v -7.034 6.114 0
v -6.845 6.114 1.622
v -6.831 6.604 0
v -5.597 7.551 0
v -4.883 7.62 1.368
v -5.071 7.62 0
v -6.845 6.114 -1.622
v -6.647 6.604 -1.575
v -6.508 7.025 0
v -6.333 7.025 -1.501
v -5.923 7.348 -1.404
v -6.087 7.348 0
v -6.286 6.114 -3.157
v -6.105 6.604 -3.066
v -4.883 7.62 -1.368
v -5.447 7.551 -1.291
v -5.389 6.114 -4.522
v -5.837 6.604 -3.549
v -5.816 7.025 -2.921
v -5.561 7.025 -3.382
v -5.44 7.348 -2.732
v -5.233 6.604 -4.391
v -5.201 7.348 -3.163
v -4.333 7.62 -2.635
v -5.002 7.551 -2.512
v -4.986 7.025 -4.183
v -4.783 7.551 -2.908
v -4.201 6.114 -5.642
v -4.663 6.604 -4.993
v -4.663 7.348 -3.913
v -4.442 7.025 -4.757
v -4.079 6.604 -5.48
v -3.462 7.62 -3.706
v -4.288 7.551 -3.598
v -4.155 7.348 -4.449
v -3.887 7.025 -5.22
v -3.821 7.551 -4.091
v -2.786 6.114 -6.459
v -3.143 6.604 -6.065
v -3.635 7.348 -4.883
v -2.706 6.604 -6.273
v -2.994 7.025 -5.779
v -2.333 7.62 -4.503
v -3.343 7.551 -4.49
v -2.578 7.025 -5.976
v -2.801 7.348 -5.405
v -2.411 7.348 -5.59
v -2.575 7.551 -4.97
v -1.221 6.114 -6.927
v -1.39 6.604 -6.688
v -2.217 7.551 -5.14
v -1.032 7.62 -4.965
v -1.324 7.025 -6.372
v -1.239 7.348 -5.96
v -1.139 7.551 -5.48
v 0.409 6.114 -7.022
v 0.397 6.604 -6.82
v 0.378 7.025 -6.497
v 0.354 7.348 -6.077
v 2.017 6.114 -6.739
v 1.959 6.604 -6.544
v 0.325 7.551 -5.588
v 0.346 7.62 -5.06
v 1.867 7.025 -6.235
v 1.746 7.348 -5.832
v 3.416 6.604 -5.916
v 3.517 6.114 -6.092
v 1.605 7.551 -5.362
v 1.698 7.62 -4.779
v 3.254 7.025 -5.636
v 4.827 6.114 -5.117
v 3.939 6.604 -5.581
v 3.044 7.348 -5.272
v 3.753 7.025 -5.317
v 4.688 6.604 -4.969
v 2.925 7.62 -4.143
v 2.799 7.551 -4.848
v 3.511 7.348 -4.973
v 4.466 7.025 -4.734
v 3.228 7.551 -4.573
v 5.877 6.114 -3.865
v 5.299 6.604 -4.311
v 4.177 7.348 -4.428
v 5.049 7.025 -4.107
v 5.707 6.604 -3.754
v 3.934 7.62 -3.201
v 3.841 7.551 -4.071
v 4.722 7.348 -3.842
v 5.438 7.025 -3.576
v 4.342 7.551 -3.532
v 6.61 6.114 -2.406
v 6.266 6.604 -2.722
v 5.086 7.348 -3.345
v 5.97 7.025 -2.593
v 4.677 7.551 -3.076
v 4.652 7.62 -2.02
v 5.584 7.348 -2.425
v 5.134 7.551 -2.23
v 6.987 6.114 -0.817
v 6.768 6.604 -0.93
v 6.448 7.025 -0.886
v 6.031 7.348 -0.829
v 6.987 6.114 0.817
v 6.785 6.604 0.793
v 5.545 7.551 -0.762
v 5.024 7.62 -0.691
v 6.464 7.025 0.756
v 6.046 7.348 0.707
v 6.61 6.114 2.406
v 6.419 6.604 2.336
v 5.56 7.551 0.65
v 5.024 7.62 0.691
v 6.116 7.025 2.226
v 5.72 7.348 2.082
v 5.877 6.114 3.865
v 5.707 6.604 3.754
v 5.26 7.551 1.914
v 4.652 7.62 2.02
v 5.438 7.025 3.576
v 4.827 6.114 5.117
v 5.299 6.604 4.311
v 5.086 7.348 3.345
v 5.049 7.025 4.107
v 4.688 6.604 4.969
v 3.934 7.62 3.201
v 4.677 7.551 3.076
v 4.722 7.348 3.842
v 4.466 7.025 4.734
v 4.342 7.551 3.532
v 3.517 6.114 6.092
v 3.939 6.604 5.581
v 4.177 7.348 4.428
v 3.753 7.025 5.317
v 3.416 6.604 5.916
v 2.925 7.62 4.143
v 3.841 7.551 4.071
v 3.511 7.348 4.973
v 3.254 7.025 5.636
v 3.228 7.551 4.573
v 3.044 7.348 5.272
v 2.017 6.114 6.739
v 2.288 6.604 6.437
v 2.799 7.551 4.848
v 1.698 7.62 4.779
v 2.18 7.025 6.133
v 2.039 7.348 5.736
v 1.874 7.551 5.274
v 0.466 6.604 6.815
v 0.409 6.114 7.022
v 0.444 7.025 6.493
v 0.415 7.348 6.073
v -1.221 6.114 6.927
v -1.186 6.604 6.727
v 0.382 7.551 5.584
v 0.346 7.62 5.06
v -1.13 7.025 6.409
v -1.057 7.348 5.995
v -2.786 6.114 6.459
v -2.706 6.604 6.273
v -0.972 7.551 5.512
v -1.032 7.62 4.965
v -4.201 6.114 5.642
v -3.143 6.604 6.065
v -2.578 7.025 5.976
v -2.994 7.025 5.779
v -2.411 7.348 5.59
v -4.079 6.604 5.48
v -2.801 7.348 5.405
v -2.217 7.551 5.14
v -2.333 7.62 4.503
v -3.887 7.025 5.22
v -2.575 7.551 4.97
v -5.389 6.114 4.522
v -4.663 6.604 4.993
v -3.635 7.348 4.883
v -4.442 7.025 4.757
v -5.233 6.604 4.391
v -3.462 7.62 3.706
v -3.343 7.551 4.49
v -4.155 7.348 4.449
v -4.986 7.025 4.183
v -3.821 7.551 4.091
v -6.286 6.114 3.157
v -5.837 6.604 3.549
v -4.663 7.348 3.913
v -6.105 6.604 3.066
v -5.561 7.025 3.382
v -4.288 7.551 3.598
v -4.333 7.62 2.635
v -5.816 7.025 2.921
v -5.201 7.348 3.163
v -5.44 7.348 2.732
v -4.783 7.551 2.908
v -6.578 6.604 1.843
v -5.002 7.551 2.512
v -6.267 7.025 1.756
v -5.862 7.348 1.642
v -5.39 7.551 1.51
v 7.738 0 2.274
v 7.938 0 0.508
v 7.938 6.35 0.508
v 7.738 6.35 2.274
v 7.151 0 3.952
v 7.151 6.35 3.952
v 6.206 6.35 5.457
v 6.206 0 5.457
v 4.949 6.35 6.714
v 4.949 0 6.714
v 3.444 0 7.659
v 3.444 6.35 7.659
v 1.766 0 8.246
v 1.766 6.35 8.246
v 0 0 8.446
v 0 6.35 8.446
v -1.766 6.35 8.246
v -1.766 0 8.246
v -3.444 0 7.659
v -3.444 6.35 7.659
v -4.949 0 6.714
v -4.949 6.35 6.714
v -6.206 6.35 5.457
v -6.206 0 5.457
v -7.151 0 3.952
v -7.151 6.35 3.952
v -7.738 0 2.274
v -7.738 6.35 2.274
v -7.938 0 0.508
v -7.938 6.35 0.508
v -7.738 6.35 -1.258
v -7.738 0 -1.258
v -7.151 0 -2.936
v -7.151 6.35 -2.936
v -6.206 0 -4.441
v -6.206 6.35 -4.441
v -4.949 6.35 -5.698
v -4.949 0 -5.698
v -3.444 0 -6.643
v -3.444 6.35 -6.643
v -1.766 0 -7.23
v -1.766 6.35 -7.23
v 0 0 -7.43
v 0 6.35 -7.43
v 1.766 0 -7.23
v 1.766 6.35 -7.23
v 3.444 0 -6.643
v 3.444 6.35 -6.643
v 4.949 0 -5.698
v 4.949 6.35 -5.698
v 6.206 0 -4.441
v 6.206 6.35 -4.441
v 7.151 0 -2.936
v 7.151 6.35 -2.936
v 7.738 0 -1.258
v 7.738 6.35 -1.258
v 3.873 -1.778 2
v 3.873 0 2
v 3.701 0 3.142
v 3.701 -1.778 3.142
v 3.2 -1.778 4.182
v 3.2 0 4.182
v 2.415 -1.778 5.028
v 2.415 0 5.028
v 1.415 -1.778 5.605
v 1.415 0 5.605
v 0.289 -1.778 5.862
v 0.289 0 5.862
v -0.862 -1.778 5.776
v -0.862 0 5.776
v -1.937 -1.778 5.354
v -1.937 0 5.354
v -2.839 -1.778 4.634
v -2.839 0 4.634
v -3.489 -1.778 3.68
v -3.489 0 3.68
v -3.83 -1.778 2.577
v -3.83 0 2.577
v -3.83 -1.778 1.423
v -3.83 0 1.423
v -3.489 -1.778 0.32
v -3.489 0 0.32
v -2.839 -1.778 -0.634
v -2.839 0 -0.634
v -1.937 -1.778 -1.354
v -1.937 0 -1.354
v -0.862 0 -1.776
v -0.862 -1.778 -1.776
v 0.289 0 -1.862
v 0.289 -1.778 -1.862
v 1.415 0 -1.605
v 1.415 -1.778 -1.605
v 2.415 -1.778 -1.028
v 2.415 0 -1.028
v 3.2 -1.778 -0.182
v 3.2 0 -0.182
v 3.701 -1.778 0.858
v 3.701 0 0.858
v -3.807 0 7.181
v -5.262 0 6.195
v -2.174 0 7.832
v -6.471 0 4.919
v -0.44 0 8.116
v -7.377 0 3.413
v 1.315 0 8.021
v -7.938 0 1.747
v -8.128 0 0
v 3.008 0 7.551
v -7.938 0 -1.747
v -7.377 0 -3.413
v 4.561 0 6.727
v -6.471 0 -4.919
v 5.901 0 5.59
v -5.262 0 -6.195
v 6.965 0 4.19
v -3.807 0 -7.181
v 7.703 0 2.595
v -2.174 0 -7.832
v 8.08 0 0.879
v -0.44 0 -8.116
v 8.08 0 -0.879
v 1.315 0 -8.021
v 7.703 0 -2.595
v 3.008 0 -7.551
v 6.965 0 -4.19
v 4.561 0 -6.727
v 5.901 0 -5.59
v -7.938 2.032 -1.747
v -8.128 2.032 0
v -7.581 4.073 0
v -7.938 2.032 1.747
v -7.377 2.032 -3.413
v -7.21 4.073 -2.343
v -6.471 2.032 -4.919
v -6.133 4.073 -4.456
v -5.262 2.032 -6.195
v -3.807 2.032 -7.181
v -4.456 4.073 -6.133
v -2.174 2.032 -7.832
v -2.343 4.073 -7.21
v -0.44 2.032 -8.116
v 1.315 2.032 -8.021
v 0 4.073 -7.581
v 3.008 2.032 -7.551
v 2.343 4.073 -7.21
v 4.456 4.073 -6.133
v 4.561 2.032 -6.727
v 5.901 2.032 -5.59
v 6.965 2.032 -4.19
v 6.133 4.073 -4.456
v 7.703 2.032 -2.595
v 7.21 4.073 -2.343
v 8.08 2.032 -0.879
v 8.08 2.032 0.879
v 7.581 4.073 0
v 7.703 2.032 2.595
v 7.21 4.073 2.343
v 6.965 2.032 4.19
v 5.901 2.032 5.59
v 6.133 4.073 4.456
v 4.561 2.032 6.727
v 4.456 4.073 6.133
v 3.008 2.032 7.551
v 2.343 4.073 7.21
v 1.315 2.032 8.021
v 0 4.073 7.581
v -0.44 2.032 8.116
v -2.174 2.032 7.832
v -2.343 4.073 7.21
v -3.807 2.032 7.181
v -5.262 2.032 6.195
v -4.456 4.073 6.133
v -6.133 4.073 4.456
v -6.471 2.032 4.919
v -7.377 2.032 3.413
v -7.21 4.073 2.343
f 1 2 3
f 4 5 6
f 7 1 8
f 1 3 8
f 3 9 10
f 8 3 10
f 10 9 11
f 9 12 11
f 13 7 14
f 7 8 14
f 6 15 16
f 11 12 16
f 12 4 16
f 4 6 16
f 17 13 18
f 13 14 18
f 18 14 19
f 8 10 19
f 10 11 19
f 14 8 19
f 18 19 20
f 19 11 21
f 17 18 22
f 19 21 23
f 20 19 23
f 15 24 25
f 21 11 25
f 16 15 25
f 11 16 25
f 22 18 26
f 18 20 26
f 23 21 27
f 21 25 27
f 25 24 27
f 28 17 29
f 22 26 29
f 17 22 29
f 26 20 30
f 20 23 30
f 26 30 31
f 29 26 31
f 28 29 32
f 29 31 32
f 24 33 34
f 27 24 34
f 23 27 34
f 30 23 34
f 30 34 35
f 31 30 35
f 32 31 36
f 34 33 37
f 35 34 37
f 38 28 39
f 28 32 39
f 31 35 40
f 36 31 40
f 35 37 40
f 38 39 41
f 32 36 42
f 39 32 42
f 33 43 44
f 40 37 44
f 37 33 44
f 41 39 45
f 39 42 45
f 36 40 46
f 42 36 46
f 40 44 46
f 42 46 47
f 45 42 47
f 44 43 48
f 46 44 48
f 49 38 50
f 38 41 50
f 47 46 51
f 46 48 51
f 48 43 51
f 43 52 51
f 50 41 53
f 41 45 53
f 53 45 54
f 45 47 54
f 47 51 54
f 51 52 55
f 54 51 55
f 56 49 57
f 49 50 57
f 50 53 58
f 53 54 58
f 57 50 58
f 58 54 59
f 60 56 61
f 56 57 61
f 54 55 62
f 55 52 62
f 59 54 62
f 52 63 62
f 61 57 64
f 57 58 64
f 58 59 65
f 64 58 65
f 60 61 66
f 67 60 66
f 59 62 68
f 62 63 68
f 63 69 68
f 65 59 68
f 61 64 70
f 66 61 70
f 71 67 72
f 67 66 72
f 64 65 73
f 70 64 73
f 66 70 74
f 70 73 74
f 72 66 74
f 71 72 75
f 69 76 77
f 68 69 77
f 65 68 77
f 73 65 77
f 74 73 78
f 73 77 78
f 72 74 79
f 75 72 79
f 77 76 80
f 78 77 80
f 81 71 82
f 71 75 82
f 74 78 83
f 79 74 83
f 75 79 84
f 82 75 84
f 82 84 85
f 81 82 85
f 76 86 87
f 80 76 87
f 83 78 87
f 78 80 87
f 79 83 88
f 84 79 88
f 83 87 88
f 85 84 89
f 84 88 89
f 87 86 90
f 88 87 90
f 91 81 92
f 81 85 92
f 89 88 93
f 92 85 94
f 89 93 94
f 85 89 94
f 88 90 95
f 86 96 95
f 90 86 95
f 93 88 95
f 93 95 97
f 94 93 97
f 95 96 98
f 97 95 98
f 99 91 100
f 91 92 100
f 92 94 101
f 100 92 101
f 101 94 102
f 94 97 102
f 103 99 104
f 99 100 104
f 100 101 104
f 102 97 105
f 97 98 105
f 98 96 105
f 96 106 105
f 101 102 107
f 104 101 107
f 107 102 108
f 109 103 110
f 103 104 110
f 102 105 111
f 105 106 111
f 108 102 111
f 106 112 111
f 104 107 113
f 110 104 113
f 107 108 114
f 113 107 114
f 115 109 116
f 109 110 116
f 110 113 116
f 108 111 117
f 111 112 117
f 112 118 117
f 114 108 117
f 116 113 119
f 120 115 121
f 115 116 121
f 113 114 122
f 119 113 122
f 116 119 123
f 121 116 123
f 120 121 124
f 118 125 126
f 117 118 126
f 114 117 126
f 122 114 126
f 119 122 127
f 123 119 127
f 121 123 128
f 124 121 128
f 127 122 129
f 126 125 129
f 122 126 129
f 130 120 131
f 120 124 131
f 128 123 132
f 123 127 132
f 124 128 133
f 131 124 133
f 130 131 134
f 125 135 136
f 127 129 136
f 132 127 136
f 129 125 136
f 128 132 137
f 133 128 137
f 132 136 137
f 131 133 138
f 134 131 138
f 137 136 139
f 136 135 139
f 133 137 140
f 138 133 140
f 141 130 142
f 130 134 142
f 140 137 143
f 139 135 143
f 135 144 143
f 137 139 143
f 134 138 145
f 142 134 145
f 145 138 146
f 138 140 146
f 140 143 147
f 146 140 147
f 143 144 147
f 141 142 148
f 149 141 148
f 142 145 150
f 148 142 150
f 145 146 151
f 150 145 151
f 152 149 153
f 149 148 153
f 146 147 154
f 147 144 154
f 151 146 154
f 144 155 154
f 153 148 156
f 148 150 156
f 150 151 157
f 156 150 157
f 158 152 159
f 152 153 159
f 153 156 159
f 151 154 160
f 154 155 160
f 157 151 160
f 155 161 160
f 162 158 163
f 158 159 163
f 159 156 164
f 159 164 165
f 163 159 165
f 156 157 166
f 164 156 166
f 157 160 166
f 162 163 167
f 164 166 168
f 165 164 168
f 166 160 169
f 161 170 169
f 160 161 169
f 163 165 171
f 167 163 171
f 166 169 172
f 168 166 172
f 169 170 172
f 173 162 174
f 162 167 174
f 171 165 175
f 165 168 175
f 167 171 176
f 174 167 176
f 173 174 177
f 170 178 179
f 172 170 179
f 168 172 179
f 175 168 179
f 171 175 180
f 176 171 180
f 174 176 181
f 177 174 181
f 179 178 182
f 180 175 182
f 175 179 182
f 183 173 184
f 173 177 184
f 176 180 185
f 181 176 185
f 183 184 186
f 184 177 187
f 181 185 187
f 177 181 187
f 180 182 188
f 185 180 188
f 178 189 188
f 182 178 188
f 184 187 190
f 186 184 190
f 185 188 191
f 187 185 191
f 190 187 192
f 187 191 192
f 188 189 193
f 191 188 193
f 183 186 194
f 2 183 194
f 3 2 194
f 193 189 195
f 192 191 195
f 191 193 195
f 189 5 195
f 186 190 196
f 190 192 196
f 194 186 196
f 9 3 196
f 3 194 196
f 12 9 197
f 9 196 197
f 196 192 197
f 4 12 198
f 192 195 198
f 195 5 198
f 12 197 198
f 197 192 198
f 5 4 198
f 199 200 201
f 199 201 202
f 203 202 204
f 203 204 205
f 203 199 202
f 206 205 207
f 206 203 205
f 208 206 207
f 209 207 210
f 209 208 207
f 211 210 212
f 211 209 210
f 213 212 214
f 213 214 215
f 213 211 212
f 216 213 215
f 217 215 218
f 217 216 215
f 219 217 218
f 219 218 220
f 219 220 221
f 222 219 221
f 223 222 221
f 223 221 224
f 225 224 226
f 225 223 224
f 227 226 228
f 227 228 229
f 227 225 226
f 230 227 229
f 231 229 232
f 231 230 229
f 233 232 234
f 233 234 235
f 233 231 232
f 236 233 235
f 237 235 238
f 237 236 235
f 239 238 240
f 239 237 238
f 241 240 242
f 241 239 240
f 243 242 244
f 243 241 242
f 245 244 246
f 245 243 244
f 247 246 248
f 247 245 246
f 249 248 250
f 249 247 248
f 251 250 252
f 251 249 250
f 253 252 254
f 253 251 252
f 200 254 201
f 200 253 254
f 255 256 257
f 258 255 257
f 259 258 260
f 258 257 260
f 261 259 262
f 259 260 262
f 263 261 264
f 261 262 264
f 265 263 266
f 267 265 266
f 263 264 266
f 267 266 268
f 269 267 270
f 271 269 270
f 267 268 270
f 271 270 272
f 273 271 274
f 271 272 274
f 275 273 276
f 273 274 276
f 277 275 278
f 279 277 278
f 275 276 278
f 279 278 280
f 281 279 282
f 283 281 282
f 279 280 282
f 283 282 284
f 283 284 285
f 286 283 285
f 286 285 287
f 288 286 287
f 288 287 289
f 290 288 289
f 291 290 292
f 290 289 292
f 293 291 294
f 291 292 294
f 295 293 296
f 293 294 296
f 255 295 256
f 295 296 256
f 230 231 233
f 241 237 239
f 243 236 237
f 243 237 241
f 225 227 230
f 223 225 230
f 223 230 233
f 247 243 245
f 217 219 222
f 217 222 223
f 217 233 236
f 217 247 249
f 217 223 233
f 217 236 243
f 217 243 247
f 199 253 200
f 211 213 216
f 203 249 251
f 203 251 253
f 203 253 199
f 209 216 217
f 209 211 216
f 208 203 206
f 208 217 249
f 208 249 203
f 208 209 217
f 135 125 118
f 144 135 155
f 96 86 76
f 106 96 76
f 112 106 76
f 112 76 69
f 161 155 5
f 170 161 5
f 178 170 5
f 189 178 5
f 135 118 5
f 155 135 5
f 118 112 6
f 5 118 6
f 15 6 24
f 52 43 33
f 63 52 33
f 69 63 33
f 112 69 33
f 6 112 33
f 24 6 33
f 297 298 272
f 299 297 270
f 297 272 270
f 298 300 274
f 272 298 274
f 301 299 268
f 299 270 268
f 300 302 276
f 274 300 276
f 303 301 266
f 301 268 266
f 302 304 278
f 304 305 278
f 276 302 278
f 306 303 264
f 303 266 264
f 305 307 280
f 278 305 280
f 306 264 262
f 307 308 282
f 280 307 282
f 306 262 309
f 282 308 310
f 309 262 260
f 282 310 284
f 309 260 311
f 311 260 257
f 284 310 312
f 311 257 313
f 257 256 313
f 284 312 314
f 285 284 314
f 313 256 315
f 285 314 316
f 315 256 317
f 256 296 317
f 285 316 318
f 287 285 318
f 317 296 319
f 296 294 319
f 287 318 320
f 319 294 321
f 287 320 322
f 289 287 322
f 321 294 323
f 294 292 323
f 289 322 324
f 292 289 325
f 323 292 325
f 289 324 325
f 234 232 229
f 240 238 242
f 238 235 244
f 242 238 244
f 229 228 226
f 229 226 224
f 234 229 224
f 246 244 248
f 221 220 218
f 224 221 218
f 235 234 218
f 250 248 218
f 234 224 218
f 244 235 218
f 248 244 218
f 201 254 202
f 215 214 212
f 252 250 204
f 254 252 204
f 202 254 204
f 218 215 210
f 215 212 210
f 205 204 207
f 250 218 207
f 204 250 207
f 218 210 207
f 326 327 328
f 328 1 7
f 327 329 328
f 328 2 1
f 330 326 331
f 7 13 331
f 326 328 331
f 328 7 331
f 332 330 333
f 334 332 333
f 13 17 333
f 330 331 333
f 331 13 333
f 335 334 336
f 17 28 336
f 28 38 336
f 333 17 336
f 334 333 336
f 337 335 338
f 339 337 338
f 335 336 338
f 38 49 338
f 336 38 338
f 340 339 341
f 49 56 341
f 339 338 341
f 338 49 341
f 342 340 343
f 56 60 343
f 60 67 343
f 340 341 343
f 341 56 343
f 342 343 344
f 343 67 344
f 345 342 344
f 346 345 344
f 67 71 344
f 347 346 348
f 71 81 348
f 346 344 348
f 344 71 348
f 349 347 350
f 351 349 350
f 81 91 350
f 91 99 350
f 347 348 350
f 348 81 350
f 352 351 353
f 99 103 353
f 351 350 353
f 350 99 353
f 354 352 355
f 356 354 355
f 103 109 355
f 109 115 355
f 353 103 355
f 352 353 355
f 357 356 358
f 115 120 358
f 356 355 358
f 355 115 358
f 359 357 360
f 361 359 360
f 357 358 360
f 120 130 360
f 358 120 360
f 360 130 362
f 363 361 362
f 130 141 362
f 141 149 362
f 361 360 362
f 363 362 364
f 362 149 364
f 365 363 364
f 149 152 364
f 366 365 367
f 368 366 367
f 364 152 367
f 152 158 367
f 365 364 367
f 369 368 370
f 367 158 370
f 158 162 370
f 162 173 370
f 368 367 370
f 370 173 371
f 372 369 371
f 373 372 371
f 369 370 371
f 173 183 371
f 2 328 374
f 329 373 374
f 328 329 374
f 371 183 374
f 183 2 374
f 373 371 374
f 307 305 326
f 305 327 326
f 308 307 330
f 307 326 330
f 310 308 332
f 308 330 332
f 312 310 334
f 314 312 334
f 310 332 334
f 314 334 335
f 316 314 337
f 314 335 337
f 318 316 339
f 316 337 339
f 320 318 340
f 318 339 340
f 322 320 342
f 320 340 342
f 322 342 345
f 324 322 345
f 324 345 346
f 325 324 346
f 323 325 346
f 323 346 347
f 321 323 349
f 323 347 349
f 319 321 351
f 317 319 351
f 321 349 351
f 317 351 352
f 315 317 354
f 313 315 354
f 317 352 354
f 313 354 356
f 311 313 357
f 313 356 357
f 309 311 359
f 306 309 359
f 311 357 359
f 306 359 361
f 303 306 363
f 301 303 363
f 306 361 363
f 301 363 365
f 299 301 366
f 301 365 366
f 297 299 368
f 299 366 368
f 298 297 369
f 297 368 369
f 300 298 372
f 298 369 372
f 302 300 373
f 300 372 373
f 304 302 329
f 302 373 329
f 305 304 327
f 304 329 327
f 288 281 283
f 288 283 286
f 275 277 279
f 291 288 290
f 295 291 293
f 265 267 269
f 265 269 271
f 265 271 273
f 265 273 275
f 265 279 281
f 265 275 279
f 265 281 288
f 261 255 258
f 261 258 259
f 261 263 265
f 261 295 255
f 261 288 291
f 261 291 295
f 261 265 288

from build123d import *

# Parameters (mm, degrees)
DELETEFACE1_OUTLINE_R = 1.4732
DELETEFACE1_DEPTH     = 7.62
SKETCH3_R             = 3.873
BOSS_EXTRUDE1_DEPTH   = 1.778
SKETCH4_R             = 7.9375
BOSS_EXTRUDE2_DEPTH   = 6.35


# Read off the part's stored shape, not the designer's step: DeleteFace1
with BuildPart() as part:
    # Sketch1 → Revolve1 (revolve)
    with BuildSketch(Plane.XY):
        with BuildLine():
            Line((-1.4732, 0), (-8.128, 0))
            Line((-8.128, 0), (-8.128, 2.032))
            Line((-8.128, 2.032), (-7.034252752, 6.1139203))
            ThreePointArc((-7.034252752, 6.1139203), (-6.308494697, 7.200093987), (-5.071491473, 7.62))
            Line((-5.071491473, 7.62), (-1.4732, 7.62))
            Line((-1.4732, 7.62), (-1.4732, 0))
        make_face()
    revolve(axis=Axis((0, 0, 0), (0, -1, 0)))

    # DeleteFace1 outline → DeleteFace1 (add)
    with BuildSketch(Plane(origin=(0, 0, 0), x_dir=(1, 0, 0), z_dir=(0, 1, 0))):
        Circle(DELETEFACE1_OUTLINE_R)
    extrude(amount=DELETEFACE1_DEPTH)

    # Sketch3 → Boss-Extrude1 (add)
    with BuildSketch(Plane.XZ):
        with Locations((0, 2)):
            Circle(SKETCH3_R)
    extrude(amount=BOSS_EXTRUDE1_DEPTH)


with BuildPart() as body_2:
    # Sketch4 → Boss-Extrude2 (new body)
    with BuildSketch(Plane.XZ):
        with Locations((0, 0.508)):
            Circle(SKETCH4_R)
    extrude(amount=-BOSS_EXTRUDE2_DEPTH)


solid = Compound([part.part, body_2.part])
